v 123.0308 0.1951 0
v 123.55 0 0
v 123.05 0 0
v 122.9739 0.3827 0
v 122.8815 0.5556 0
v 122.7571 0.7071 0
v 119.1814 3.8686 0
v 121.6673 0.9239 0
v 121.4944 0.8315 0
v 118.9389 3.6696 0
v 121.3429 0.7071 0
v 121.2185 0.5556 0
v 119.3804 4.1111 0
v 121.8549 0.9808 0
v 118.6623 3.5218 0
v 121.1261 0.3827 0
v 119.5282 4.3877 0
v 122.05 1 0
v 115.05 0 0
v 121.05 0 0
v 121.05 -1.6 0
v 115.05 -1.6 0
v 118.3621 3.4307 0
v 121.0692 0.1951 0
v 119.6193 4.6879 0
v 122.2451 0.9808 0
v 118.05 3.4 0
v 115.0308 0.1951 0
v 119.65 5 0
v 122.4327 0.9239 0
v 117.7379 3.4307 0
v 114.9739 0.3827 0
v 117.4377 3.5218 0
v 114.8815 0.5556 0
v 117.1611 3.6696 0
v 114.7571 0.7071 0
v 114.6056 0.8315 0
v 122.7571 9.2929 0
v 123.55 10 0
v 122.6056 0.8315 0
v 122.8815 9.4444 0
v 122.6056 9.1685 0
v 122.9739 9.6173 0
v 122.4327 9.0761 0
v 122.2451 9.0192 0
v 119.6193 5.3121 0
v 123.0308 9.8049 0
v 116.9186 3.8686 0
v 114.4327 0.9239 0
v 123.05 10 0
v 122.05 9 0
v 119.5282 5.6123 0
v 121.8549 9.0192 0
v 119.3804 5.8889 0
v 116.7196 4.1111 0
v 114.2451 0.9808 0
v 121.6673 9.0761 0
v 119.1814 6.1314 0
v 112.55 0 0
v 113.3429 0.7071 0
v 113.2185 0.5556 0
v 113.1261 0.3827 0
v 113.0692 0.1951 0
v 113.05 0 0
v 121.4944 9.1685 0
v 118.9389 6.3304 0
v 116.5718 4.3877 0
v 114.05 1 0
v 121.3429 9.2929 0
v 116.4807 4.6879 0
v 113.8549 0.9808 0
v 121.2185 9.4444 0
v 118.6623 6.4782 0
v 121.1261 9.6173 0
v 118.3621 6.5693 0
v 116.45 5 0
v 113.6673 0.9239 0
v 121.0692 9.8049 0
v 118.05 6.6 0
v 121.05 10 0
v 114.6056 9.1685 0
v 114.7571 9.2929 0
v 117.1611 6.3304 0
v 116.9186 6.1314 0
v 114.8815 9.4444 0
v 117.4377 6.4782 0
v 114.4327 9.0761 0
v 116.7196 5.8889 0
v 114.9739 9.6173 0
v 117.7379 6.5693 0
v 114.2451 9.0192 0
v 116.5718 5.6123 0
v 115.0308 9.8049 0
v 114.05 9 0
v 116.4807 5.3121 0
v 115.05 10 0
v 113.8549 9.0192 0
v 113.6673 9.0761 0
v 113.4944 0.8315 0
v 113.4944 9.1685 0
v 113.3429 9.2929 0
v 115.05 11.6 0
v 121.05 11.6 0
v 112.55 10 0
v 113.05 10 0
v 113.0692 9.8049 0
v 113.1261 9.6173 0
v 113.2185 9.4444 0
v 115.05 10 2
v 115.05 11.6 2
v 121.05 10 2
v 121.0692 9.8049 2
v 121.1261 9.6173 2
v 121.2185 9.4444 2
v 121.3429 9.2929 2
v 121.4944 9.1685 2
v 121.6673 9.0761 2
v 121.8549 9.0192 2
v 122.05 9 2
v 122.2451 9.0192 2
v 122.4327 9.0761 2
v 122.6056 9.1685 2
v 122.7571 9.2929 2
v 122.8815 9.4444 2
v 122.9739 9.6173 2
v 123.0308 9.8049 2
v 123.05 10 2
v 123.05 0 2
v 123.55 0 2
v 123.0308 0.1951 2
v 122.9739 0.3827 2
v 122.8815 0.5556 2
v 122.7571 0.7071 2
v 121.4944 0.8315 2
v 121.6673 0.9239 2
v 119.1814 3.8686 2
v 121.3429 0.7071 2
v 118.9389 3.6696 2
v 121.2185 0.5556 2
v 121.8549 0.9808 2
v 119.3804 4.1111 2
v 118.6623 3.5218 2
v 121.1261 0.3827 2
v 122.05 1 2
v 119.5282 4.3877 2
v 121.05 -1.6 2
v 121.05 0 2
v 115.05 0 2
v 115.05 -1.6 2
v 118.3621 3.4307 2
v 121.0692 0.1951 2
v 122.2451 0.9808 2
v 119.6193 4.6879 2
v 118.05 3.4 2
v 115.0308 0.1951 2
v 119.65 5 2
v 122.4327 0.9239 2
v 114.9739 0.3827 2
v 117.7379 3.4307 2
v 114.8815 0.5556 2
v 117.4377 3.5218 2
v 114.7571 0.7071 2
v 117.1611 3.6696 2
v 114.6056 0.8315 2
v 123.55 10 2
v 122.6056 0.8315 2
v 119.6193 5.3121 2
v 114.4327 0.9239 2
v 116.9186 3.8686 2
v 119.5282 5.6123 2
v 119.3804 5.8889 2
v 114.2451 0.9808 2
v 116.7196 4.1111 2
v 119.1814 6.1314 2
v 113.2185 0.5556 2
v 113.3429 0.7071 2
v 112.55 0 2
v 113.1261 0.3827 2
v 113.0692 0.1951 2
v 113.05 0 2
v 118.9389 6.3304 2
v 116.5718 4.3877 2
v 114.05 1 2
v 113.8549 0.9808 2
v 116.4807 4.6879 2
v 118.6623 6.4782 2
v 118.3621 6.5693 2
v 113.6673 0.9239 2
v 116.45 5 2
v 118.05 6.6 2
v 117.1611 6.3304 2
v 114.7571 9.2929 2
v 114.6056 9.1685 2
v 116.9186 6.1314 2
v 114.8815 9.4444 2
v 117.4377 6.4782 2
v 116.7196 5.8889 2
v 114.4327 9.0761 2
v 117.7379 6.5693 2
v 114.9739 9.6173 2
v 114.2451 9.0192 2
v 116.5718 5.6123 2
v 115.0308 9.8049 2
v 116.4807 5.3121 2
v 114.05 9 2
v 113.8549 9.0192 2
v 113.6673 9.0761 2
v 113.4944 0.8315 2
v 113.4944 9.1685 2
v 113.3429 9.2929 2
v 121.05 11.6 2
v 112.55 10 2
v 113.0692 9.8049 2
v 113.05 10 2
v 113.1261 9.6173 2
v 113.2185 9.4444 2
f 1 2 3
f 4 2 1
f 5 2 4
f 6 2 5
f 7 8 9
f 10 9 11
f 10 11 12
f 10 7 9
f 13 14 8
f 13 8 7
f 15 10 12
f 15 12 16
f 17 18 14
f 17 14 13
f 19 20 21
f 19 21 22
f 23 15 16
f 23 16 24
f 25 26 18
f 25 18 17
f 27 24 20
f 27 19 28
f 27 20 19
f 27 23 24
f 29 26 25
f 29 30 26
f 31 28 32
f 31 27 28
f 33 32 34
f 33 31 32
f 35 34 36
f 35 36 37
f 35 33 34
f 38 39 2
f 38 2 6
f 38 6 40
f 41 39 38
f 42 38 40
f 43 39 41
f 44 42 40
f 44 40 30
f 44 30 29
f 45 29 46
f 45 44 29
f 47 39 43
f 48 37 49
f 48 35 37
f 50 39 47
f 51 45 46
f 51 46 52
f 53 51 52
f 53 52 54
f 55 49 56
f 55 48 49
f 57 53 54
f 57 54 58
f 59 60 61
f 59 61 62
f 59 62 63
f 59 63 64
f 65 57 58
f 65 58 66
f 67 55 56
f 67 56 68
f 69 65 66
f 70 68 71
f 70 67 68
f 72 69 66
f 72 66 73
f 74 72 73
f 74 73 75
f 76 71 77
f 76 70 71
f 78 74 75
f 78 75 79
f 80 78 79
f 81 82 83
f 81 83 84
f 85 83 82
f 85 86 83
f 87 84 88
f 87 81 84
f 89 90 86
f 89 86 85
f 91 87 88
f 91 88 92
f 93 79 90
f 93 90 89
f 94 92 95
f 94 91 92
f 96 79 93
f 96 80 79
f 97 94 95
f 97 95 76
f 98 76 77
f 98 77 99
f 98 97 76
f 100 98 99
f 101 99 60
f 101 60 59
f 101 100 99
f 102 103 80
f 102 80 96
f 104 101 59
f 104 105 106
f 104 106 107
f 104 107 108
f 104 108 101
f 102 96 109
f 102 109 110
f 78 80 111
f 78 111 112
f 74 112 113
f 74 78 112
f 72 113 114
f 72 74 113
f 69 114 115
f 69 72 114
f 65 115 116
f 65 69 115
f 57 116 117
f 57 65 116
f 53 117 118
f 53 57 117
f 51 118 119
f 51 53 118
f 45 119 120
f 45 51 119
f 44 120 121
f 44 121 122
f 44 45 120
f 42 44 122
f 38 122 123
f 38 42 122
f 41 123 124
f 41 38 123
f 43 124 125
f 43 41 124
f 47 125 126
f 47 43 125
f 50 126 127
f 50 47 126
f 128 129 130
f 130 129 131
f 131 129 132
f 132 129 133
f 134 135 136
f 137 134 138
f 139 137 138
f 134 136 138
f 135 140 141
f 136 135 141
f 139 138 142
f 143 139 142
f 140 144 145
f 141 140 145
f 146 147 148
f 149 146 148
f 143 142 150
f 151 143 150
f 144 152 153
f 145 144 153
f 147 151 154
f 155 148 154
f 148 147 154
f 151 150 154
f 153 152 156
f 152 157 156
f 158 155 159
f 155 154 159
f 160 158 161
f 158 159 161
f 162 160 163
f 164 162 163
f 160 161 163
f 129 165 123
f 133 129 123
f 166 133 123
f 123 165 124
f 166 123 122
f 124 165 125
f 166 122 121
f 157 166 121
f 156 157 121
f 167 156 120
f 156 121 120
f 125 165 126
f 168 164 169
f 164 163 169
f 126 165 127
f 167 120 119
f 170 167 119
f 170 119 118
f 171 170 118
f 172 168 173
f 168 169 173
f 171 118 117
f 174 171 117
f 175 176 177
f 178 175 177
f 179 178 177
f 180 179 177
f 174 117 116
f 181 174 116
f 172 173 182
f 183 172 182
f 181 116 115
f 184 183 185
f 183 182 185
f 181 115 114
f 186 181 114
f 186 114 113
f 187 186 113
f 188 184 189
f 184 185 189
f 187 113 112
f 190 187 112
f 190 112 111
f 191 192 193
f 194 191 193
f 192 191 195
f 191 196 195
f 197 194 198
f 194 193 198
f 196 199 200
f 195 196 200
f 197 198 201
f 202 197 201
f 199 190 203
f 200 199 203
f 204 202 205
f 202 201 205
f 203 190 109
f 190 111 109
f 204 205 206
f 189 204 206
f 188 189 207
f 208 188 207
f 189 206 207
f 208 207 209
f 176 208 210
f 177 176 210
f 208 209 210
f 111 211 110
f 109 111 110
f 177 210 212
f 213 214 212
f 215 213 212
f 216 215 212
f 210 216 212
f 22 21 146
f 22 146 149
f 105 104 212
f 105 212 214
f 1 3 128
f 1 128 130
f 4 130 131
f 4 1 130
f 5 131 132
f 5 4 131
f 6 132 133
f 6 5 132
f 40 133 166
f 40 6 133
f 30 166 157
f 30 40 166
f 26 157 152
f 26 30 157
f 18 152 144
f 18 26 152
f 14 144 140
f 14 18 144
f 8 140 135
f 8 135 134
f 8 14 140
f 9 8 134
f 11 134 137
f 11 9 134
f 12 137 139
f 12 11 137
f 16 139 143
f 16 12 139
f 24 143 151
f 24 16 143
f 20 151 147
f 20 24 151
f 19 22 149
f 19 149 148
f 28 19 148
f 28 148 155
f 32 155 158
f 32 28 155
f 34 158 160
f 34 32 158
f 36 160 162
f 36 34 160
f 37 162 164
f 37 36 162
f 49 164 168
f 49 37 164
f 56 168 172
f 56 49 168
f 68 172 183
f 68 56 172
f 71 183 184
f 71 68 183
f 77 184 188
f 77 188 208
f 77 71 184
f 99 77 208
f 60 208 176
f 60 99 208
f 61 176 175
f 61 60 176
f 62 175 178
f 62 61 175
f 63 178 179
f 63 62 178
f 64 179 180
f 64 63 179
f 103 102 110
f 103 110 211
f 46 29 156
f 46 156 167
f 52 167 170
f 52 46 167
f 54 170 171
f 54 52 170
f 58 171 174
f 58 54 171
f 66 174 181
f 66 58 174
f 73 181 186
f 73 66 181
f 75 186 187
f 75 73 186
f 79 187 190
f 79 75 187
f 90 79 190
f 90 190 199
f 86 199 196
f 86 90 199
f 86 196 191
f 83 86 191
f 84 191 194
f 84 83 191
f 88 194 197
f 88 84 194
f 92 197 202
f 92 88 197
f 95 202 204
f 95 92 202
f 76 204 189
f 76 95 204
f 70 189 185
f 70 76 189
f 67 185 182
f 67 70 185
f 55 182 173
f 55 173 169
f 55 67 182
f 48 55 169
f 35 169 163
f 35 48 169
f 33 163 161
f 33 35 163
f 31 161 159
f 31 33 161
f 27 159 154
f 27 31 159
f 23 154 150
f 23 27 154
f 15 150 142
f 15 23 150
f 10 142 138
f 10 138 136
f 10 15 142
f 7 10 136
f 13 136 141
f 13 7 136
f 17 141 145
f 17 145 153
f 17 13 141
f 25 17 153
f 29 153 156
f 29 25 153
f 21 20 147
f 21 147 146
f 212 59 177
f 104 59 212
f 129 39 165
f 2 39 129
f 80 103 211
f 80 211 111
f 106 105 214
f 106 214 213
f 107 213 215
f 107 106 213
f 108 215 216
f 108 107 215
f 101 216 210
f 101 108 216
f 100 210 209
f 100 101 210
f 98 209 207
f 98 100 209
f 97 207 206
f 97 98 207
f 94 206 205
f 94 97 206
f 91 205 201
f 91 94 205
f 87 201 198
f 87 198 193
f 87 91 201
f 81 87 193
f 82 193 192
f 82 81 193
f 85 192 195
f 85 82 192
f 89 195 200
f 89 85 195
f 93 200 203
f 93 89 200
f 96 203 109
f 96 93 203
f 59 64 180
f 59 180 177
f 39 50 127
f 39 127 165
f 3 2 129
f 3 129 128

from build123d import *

# Parameters (mm, degrees)
SKETCH1_R           = 1.6
BOSS_EXTRUDE1_DEPTH = 2


with BuildPart() as part:
    # Sketch1 → Boss-Extrude1 (new body)
    with BuildSketch(Plane.XY):
        with BuildLine():
            Line((115.05, 10), (115.05, 11.6))
            Line((115.05, 11.6), (121.05, 11.6))
            Line((121.05, 11.6), (121.05, 10))
            ThreePointArc((121.05, 10), (122.05, 9), (123.05, 10))
            Line((123.05, 10), (123.55, 10))
            Line((123.55, 10), (123.55, 0))
            Line((123.55, 0), (123.05, 0))
            ThreePointArc((123.05, 0), (122.05, 1), (121.05, 0))
            Line((121.05, 0), (121.05, -1.6))
            Line((121.05, -1.6), (115.05, -1.6))
            Line((115.05, -1.6), (115.05, 0))
            ThreePointArc((115.05, 0), (114.05, 1), (113.05, 0))
            Line((113.05, 0), (112.55, 0))
            Line((112.55, 0), (112.55, 10))
            Line((112.55, 10), (113.05, 10))
            ThreePointArc((113.05, 10), (114.05, 9), (115.05, 10))
        make_face()
        with Locations((118.05, 5)):
            Circle(SKETCH1_R, mode=Mode.SUBTRACT)
    extrude(amount=BOSS_EXTRUDE1_DEPTH)


solid = part.part
